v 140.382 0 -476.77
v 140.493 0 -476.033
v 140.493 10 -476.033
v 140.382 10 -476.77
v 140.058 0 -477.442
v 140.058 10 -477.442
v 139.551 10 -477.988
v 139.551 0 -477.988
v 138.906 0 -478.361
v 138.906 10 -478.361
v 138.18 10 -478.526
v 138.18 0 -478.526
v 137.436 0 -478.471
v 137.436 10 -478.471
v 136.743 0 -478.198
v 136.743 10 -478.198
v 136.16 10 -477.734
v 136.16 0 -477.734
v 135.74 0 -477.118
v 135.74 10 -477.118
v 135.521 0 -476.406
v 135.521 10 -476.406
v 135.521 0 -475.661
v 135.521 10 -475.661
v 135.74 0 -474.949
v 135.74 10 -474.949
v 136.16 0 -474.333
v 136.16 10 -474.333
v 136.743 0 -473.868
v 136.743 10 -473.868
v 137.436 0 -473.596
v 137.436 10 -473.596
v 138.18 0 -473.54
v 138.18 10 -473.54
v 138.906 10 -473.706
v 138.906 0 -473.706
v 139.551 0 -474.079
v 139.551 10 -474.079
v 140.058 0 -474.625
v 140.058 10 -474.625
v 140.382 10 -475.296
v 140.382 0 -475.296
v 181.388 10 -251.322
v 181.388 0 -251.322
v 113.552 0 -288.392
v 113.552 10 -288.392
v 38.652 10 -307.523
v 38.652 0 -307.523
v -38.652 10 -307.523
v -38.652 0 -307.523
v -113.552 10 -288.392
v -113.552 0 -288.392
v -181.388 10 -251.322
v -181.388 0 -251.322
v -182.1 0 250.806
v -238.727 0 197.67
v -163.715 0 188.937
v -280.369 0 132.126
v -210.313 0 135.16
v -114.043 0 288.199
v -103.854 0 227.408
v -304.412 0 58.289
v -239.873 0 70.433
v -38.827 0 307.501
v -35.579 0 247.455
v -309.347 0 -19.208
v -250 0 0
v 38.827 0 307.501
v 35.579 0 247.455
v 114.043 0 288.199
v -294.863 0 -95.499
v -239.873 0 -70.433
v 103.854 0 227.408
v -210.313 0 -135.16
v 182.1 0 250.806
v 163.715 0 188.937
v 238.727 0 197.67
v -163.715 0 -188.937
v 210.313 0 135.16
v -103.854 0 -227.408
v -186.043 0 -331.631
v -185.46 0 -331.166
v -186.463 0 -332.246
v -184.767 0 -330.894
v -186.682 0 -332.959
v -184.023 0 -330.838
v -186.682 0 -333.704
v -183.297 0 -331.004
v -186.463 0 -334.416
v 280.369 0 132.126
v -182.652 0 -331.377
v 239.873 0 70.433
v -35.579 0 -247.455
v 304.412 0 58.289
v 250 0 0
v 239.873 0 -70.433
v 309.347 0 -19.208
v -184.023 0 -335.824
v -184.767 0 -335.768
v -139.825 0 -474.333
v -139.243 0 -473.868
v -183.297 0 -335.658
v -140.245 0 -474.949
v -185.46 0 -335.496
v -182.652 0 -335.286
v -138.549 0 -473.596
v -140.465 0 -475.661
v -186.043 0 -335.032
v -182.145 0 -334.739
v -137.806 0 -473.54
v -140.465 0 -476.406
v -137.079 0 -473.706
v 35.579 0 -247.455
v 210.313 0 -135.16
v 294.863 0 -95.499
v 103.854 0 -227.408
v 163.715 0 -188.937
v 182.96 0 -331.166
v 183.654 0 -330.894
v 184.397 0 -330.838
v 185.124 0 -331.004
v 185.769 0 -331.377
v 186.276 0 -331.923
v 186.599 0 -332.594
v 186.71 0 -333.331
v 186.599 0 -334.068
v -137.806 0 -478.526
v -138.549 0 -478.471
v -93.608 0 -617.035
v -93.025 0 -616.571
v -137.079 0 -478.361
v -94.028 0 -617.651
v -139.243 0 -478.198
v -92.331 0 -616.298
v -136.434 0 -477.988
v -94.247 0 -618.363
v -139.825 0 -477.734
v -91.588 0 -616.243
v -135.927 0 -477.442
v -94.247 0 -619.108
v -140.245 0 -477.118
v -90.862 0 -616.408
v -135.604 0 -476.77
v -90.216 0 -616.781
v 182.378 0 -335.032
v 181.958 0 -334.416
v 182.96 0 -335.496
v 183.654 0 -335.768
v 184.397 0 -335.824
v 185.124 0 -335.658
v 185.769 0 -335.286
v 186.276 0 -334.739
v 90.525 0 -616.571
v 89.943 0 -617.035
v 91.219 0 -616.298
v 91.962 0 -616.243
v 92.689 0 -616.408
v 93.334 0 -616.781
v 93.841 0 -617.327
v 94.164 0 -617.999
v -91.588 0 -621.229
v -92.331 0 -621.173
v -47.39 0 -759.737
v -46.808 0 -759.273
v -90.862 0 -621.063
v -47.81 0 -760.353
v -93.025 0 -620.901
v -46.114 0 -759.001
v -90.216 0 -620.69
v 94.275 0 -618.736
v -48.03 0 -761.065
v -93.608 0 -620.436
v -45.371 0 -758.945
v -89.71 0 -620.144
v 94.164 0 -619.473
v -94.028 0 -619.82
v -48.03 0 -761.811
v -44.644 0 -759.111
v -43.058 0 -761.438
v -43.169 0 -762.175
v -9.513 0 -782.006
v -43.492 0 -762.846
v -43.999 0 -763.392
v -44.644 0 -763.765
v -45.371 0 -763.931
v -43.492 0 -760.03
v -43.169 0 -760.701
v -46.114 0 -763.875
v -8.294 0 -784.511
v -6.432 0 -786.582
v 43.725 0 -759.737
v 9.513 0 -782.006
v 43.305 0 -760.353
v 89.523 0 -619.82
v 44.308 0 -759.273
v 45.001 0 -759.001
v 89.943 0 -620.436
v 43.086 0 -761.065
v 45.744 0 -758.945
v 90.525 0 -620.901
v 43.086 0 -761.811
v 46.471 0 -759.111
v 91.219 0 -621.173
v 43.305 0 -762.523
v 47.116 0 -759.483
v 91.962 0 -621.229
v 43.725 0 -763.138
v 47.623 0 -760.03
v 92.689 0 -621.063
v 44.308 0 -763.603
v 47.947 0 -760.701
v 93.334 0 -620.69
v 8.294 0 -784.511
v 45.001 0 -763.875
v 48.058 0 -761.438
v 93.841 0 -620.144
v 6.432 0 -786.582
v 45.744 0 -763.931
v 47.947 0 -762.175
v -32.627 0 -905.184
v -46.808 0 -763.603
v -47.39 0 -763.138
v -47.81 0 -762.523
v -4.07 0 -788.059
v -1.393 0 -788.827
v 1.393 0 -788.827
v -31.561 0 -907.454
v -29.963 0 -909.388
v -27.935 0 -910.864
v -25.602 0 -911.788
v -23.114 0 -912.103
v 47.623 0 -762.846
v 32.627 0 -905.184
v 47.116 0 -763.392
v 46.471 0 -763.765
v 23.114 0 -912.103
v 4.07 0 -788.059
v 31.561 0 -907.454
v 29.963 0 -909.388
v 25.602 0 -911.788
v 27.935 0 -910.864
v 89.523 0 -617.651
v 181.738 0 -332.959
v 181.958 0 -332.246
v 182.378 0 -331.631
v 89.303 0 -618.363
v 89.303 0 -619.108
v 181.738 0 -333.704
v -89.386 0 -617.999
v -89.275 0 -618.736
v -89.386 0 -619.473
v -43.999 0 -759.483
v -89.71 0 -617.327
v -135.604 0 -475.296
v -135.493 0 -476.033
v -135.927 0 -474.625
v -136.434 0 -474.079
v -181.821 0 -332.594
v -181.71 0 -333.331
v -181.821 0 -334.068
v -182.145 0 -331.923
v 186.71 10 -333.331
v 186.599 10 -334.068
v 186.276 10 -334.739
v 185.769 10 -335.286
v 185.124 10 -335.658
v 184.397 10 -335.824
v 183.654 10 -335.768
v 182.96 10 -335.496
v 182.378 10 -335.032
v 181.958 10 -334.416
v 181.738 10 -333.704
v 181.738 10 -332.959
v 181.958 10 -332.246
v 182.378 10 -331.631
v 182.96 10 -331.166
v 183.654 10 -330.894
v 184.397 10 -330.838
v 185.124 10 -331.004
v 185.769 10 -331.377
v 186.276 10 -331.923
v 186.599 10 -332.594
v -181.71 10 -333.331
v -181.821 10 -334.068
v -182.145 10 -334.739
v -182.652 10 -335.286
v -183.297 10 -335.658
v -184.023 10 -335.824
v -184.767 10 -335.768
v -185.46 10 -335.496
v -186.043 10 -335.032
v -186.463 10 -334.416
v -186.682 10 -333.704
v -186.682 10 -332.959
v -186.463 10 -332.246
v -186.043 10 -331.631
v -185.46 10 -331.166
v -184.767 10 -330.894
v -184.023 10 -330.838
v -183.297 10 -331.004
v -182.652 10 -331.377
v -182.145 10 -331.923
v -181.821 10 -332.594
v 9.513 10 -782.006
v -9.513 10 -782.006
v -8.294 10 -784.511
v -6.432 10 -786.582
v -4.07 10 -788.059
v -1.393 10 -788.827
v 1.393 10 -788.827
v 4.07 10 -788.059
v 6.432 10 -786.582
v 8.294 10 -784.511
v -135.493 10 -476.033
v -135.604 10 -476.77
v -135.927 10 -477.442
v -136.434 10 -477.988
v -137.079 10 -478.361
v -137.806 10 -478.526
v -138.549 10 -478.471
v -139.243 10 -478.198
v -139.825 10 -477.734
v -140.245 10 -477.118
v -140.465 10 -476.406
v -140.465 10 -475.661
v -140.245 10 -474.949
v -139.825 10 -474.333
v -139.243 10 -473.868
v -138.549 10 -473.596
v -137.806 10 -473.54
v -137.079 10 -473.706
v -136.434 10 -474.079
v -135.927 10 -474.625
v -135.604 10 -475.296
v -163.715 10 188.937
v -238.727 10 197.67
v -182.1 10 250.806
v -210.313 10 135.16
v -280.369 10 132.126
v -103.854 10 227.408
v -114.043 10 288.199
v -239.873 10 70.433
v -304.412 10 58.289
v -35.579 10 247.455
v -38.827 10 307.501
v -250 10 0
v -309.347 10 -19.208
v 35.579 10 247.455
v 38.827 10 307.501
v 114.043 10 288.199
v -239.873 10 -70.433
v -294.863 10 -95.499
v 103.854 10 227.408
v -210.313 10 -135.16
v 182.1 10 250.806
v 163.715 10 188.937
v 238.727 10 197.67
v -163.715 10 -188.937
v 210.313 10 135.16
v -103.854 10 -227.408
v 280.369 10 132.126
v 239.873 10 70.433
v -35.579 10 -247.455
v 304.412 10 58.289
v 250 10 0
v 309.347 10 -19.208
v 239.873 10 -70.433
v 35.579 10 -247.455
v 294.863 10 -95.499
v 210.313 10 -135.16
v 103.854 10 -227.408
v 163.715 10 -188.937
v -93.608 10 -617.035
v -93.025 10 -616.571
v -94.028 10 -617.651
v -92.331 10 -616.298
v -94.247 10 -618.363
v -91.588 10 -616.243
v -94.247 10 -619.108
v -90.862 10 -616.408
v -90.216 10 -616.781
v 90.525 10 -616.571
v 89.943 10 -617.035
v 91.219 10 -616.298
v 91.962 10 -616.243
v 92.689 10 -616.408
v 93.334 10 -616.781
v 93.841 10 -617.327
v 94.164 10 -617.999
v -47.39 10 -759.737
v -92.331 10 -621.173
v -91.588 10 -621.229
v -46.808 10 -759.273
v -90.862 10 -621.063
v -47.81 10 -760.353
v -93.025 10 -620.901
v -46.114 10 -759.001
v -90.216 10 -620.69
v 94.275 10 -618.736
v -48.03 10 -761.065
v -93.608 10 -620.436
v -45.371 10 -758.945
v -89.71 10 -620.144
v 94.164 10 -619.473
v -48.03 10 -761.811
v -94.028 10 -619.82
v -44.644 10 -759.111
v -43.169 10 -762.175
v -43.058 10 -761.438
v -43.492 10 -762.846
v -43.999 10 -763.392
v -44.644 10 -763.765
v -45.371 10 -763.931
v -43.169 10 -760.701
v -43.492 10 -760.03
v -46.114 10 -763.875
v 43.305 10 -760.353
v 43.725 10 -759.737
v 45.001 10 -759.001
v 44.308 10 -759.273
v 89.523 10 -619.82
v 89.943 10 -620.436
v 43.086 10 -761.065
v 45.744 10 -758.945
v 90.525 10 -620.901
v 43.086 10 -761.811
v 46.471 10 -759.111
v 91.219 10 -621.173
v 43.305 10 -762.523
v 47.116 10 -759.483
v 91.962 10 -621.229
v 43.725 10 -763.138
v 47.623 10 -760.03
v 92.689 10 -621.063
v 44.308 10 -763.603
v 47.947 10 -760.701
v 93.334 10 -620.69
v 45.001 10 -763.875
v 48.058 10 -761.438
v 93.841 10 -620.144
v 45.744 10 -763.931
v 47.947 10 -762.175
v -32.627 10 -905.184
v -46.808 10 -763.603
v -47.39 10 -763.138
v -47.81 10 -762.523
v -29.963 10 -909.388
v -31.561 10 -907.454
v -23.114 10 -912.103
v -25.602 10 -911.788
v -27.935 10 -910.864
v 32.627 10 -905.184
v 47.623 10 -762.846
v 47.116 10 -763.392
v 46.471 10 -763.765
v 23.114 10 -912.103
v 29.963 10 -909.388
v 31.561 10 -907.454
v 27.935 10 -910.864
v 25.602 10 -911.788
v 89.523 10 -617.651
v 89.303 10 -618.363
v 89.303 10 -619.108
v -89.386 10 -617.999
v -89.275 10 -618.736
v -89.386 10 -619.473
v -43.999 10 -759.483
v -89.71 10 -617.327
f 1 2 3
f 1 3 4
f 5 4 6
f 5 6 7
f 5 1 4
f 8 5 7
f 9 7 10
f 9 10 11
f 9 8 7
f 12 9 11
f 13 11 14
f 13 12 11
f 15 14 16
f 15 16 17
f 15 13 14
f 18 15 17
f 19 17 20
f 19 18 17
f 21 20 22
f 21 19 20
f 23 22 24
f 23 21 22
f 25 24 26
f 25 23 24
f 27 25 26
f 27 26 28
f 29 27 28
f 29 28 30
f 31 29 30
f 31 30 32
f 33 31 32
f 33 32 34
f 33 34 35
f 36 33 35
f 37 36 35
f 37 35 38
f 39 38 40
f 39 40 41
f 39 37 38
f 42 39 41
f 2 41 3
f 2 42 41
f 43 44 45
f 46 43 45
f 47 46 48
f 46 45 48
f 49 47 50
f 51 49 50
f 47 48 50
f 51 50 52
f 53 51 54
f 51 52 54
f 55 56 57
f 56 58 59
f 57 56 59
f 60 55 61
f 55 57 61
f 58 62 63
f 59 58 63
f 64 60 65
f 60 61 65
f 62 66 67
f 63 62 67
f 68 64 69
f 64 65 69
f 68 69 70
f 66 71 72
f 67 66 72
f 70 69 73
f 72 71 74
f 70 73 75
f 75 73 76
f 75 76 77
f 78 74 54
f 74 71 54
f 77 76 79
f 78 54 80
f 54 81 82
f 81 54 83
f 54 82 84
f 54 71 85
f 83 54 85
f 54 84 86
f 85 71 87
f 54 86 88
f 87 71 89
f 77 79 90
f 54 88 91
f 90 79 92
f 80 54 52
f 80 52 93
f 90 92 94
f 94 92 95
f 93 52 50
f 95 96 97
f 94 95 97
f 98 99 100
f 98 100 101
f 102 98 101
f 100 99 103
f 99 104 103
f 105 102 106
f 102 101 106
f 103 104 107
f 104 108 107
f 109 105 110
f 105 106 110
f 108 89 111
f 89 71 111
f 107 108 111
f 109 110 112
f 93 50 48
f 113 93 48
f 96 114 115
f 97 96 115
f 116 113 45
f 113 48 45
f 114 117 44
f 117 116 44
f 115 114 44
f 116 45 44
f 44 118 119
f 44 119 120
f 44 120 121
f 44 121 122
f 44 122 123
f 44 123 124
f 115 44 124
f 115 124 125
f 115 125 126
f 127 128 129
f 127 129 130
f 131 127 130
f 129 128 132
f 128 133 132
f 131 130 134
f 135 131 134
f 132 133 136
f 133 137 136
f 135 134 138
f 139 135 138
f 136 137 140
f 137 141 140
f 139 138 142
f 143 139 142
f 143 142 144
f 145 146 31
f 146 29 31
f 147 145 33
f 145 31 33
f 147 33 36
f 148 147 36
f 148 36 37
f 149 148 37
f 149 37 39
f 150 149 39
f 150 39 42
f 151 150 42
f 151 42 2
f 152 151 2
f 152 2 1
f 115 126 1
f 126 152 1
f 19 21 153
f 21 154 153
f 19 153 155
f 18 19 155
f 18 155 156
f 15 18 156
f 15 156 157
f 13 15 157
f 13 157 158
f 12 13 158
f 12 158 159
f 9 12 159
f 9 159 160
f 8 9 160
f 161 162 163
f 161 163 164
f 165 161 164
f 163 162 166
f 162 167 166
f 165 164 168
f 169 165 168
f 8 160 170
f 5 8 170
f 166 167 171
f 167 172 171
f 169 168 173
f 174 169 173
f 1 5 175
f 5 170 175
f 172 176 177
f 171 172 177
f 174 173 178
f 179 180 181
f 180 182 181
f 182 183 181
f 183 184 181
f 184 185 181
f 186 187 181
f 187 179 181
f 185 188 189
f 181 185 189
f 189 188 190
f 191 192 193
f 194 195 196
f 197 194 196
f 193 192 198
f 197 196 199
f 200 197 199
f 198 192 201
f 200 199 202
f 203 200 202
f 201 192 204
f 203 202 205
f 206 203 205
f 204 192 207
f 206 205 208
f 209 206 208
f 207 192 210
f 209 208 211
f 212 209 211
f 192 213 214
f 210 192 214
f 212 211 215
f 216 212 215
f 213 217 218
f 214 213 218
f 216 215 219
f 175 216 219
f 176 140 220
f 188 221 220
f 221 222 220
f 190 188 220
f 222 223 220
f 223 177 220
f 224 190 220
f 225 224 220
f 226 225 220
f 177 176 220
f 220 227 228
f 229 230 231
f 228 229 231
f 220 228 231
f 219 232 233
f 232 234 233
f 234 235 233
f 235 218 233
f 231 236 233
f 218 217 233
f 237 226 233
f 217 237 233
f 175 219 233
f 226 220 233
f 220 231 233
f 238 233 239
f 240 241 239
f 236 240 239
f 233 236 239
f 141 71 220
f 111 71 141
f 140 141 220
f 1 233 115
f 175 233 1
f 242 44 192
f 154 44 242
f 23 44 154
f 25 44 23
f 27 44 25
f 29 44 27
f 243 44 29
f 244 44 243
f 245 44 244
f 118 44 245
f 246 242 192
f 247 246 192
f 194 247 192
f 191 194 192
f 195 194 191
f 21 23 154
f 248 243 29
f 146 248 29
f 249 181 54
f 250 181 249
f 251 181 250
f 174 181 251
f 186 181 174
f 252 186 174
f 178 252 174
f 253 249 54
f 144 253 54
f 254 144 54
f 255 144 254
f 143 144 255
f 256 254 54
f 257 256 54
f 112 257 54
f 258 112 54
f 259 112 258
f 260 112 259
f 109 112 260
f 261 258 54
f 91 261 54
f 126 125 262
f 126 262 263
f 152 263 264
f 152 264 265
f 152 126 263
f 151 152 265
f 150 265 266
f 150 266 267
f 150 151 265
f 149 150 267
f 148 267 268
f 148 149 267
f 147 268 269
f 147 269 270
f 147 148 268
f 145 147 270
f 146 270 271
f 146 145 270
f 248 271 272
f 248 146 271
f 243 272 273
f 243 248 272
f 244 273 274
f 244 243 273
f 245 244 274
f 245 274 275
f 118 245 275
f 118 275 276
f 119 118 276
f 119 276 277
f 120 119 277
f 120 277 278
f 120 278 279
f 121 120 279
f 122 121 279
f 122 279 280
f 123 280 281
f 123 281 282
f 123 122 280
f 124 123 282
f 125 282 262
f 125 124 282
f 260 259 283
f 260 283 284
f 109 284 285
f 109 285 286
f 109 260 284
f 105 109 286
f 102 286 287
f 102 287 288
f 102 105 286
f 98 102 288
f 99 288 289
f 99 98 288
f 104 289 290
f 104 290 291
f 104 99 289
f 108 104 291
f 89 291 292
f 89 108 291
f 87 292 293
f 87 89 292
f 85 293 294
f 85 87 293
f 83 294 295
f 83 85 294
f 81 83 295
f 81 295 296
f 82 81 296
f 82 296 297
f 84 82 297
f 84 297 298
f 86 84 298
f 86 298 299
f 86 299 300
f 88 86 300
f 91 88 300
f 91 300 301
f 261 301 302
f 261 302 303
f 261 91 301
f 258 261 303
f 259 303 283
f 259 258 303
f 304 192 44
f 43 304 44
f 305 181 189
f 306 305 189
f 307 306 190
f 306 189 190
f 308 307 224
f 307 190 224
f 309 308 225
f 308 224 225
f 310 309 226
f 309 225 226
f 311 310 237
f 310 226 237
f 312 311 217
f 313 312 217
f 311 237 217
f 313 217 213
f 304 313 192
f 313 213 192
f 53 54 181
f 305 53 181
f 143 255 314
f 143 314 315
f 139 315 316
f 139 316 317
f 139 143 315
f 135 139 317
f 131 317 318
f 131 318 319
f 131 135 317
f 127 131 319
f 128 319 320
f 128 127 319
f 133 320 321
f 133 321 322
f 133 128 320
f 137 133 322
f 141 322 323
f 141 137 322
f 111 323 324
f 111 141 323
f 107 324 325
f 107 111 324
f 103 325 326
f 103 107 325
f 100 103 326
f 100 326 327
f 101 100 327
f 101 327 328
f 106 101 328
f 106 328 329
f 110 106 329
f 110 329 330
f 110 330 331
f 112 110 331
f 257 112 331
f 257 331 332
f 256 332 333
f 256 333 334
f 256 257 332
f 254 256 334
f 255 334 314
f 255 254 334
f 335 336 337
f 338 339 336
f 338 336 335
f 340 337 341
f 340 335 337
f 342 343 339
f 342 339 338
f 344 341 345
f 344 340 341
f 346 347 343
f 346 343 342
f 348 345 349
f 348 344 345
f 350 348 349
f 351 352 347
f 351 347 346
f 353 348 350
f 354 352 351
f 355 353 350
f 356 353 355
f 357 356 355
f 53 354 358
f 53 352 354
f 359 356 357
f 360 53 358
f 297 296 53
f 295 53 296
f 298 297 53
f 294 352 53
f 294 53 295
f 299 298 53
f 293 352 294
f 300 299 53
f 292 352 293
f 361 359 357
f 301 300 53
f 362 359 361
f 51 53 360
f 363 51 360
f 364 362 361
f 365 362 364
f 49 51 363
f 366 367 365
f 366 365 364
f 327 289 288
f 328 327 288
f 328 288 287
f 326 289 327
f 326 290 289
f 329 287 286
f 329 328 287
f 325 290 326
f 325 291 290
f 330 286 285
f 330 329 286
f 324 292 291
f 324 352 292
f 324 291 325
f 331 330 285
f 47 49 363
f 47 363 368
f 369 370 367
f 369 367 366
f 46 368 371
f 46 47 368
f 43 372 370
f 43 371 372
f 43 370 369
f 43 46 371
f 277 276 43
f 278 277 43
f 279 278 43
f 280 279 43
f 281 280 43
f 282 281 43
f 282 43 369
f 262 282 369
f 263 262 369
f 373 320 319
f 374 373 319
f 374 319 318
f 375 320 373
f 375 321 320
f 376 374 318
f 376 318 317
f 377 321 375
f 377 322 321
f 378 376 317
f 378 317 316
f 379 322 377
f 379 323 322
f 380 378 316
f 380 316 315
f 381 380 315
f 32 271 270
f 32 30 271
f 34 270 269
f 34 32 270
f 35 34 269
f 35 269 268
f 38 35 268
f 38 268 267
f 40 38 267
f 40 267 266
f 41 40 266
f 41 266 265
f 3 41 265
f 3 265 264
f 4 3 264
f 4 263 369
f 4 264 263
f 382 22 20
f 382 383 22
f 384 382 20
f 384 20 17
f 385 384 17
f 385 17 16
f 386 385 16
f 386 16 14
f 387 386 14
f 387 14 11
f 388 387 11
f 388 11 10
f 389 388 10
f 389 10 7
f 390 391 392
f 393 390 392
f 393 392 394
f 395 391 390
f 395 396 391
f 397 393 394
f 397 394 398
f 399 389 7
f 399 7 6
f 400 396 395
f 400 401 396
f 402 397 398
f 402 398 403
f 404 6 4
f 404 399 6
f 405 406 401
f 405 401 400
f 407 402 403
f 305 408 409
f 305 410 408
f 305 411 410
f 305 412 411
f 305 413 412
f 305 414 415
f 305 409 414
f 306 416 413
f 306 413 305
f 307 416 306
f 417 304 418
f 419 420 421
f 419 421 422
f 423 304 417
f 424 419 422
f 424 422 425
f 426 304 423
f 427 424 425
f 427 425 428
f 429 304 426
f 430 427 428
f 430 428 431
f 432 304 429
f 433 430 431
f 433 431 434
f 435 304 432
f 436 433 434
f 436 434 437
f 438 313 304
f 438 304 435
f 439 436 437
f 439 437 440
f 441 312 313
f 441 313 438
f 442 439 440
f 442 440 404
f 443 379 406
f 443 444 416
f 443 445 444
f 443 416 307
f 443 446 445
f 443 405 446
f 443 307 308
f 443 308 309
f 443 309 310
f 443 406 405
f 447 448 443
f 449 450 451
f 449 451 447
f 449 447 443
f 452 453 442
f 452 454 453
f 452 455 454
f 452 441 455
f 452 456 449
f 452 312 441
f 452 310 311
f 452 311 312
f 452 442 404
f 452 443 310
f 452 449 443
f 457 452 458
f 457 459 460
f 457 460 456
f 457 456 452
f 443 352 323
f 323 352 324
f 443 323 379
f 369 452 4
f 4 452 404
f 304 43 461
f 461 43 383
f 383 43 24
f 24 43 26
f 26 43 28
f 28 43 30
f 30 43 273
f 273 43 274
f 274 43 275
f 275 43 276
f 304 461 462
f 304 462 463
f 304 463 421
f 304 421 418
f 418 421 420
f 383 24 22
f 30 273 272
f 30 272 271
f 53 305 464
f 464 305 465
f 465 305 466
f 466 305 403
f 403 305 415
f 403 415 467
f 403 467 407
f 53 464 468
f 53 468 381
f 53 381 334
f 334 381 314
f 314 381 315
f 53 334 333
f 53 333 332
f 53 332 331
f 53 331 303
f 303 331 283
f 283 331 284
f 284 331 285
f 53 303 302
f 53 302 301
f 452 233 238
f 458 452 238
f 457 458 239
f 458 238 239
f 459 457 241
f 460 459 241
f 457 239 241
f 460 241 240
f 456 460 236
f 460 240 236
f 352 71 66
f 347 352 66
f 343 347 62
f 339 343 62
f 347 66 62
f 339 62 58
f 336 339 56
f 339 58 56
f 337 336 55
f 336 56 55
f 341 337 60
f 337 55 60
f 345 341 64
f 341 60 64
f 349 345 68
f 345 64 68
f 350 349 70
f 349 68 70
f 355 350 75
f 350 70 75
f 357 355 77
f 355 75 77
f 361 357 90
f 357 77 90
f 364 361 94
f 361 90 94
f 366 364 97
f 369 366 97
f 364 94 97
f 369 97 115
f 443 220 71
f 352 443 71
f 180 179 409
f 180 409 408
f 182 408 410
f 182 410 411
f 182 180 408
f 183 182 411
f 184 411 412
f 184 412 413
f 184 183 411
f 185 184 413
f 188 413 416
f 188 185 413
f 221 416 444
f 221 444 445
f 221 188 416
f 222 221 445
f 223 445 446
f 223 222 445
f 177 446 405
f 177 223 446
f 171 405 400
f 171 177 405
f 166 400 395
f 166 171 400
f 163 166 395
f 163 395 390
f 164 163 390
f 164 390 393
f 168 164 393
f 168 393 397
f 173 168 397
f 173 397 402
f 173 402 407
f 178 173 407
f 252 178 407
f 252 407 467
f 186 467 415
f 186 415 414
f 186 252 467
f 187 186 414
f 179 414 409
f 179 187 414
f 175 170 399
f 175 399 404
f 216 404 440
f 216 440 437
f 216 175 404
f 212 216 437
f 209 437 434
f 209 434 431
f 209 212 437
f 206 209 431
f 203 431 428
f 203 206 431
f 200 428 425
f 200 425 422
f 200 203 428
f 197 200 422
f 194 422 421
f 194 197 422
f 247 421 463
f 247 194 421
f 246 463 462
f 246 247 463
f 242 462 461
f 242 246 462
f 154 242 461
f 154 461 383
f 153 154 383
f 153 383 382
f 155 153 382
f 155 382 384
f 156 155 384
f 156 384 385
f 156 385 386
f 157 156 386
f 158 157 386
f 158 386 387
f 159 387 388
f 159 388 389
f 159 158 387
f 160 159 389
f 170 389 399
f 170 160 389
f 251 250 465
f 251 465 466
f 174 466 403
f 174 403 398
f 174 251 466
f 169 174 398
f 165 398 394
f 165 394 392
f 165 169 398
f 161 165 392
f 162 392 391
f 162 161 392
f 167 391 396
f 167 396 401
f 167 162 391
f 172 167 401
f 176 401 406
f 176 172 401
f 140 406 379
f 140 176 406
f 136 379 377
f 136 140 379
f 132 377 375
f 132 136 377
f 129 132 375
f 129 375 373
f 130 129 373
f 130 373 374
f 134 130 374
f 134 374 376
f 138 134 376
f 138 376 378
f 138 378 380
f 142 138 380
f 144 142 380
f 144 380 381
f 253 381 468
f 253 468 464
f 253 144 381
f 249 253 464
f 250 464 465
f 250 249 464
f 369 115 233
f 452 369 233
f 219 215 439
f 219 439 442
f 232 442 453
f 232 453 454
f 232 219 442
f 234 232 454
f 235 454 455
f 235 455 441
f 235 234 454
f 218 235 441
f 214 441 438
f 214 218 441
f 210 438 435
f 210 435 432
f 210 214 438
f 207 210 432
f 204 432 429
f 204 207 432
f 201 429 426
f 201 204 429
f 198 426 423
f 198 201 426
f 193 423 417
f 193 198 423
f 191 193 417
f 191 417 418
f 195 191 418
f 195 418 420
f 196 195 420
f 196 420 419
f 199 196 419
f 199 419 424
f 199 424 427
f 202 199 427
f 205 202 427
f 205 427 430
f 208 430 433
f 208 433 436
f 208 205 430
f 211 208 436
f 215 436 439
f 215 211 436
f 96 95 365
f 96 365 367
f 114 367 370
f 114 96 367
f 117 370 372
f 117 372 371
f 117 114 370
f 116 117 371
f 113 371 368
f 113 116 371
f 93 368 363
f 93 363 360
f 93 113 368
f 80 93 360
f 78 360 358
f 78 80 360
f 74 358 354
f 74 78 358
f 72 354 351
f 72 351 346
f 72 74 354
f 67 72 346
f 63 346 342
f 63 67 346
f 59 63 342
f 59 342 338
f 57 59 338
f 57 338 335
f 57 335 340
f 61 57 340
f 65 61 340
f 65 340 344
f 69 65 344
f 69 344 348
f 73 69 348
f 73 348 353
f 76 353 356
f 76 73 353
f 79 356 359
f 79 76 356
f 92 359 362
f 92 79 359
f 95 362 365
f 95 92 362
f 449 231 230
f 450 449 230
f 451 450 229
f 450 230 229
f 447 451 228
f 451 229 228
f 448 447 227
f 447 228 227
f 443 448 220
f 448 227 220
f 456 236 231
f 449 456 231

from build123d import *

# Parameters (mm, degrees)
SKETCH2_R           = 250
SKETCH2_R_2         = 2.5
BOSS_EXTRUDE1_DEPTH = 10


with BuildPart() as part:
    # Sketch2 → Boss-Extrude1 (new body)
    with BuildSketch(Plane(origin=(0, 0, 0), x_dir=(1, 0, 0), z_dir=(0, 1, 0))):
        with BuildLine():
            Line((-32.627158959, 905.183764104), (-294.863184644, 95.498530059))
            ThreePointArc((-294.863184644, 95.498530059), (0, -309.942360613), (294.863184644, 95.498530059))
            Line((294.863184644, 95.498530059), (32.627158959, 905.183764104))
            ThreePointArc((32.627158959, 905.183764104), (28.995353361, 910.189981994), (23.11367445, 912.102593467))
            Line((23.11367445, 912.102593467), (-23.11367445, 912.102593467))
            ThreePointArc((-23.11367445, 912.102593467), (-28.995353361, 910.189981994), (-32.627158959, 905.183764104))
        make_face()
        Circle(SKETCH2_R, mode=Mode.SUBTRACT)
        with Locations((-184.210314713, 333.331115971)):
            Circle(SKETCH2_R_2, mode=Mode.SUBTRACT)
        with Locations((-137.992755162, 476.03338361)):
            Circle(SKETCH2_R_2, mode=Mode.SUBTRACT)
        with Locations((-91.775195611, 618.735651249)):
            Circle(SKETCH2_R_2, mode=Mode.SUBTRACT)
        with Locations((-45.557636061, 761.437918887)):
            Circle(SKETCH2_R_2, mode=Mode.SUBTRACT)
        with BuildLine():
            ThreePointArc((181.388362207, 251.321564848), (0, 309.942360613), (-181.388362207, 251.321564848))
            Line((-181.388362207, 251.321564848), (-9.513484509, 782.005898596))
            ThreePointArc((-9.513484509, 782.005898596), (0, 788.92472796), (9.513484509, 782.005898596))
            Line((9.513484509, 782.005898596), (181.388362207, 251.321564848))
        make_face(mode=Mode.SUBTRACT)
        with Locations((137.992755162, 476.03338361)):
            Circle(SKETCH2_R_2, mode=Mode.SUBTRACT)
        with Locations((184.210314713, 333.331115971)):
            Circle(SKETCH2_R_2, mode=Mode.SUBTRACT)
        with Locations((91.775195611, 618.735651249)):
            Circle(SKETCH2_R_2, mode=Mode.SUBTRACT)
        with Locations((45.557636061, 761.437918887)):
            Circle(SKETCH2_R_2, mode=Mode.SUBTRACT)
    extrude(amount=BOSS_EXTRUDE1_DEPTH)


solid = part.part
